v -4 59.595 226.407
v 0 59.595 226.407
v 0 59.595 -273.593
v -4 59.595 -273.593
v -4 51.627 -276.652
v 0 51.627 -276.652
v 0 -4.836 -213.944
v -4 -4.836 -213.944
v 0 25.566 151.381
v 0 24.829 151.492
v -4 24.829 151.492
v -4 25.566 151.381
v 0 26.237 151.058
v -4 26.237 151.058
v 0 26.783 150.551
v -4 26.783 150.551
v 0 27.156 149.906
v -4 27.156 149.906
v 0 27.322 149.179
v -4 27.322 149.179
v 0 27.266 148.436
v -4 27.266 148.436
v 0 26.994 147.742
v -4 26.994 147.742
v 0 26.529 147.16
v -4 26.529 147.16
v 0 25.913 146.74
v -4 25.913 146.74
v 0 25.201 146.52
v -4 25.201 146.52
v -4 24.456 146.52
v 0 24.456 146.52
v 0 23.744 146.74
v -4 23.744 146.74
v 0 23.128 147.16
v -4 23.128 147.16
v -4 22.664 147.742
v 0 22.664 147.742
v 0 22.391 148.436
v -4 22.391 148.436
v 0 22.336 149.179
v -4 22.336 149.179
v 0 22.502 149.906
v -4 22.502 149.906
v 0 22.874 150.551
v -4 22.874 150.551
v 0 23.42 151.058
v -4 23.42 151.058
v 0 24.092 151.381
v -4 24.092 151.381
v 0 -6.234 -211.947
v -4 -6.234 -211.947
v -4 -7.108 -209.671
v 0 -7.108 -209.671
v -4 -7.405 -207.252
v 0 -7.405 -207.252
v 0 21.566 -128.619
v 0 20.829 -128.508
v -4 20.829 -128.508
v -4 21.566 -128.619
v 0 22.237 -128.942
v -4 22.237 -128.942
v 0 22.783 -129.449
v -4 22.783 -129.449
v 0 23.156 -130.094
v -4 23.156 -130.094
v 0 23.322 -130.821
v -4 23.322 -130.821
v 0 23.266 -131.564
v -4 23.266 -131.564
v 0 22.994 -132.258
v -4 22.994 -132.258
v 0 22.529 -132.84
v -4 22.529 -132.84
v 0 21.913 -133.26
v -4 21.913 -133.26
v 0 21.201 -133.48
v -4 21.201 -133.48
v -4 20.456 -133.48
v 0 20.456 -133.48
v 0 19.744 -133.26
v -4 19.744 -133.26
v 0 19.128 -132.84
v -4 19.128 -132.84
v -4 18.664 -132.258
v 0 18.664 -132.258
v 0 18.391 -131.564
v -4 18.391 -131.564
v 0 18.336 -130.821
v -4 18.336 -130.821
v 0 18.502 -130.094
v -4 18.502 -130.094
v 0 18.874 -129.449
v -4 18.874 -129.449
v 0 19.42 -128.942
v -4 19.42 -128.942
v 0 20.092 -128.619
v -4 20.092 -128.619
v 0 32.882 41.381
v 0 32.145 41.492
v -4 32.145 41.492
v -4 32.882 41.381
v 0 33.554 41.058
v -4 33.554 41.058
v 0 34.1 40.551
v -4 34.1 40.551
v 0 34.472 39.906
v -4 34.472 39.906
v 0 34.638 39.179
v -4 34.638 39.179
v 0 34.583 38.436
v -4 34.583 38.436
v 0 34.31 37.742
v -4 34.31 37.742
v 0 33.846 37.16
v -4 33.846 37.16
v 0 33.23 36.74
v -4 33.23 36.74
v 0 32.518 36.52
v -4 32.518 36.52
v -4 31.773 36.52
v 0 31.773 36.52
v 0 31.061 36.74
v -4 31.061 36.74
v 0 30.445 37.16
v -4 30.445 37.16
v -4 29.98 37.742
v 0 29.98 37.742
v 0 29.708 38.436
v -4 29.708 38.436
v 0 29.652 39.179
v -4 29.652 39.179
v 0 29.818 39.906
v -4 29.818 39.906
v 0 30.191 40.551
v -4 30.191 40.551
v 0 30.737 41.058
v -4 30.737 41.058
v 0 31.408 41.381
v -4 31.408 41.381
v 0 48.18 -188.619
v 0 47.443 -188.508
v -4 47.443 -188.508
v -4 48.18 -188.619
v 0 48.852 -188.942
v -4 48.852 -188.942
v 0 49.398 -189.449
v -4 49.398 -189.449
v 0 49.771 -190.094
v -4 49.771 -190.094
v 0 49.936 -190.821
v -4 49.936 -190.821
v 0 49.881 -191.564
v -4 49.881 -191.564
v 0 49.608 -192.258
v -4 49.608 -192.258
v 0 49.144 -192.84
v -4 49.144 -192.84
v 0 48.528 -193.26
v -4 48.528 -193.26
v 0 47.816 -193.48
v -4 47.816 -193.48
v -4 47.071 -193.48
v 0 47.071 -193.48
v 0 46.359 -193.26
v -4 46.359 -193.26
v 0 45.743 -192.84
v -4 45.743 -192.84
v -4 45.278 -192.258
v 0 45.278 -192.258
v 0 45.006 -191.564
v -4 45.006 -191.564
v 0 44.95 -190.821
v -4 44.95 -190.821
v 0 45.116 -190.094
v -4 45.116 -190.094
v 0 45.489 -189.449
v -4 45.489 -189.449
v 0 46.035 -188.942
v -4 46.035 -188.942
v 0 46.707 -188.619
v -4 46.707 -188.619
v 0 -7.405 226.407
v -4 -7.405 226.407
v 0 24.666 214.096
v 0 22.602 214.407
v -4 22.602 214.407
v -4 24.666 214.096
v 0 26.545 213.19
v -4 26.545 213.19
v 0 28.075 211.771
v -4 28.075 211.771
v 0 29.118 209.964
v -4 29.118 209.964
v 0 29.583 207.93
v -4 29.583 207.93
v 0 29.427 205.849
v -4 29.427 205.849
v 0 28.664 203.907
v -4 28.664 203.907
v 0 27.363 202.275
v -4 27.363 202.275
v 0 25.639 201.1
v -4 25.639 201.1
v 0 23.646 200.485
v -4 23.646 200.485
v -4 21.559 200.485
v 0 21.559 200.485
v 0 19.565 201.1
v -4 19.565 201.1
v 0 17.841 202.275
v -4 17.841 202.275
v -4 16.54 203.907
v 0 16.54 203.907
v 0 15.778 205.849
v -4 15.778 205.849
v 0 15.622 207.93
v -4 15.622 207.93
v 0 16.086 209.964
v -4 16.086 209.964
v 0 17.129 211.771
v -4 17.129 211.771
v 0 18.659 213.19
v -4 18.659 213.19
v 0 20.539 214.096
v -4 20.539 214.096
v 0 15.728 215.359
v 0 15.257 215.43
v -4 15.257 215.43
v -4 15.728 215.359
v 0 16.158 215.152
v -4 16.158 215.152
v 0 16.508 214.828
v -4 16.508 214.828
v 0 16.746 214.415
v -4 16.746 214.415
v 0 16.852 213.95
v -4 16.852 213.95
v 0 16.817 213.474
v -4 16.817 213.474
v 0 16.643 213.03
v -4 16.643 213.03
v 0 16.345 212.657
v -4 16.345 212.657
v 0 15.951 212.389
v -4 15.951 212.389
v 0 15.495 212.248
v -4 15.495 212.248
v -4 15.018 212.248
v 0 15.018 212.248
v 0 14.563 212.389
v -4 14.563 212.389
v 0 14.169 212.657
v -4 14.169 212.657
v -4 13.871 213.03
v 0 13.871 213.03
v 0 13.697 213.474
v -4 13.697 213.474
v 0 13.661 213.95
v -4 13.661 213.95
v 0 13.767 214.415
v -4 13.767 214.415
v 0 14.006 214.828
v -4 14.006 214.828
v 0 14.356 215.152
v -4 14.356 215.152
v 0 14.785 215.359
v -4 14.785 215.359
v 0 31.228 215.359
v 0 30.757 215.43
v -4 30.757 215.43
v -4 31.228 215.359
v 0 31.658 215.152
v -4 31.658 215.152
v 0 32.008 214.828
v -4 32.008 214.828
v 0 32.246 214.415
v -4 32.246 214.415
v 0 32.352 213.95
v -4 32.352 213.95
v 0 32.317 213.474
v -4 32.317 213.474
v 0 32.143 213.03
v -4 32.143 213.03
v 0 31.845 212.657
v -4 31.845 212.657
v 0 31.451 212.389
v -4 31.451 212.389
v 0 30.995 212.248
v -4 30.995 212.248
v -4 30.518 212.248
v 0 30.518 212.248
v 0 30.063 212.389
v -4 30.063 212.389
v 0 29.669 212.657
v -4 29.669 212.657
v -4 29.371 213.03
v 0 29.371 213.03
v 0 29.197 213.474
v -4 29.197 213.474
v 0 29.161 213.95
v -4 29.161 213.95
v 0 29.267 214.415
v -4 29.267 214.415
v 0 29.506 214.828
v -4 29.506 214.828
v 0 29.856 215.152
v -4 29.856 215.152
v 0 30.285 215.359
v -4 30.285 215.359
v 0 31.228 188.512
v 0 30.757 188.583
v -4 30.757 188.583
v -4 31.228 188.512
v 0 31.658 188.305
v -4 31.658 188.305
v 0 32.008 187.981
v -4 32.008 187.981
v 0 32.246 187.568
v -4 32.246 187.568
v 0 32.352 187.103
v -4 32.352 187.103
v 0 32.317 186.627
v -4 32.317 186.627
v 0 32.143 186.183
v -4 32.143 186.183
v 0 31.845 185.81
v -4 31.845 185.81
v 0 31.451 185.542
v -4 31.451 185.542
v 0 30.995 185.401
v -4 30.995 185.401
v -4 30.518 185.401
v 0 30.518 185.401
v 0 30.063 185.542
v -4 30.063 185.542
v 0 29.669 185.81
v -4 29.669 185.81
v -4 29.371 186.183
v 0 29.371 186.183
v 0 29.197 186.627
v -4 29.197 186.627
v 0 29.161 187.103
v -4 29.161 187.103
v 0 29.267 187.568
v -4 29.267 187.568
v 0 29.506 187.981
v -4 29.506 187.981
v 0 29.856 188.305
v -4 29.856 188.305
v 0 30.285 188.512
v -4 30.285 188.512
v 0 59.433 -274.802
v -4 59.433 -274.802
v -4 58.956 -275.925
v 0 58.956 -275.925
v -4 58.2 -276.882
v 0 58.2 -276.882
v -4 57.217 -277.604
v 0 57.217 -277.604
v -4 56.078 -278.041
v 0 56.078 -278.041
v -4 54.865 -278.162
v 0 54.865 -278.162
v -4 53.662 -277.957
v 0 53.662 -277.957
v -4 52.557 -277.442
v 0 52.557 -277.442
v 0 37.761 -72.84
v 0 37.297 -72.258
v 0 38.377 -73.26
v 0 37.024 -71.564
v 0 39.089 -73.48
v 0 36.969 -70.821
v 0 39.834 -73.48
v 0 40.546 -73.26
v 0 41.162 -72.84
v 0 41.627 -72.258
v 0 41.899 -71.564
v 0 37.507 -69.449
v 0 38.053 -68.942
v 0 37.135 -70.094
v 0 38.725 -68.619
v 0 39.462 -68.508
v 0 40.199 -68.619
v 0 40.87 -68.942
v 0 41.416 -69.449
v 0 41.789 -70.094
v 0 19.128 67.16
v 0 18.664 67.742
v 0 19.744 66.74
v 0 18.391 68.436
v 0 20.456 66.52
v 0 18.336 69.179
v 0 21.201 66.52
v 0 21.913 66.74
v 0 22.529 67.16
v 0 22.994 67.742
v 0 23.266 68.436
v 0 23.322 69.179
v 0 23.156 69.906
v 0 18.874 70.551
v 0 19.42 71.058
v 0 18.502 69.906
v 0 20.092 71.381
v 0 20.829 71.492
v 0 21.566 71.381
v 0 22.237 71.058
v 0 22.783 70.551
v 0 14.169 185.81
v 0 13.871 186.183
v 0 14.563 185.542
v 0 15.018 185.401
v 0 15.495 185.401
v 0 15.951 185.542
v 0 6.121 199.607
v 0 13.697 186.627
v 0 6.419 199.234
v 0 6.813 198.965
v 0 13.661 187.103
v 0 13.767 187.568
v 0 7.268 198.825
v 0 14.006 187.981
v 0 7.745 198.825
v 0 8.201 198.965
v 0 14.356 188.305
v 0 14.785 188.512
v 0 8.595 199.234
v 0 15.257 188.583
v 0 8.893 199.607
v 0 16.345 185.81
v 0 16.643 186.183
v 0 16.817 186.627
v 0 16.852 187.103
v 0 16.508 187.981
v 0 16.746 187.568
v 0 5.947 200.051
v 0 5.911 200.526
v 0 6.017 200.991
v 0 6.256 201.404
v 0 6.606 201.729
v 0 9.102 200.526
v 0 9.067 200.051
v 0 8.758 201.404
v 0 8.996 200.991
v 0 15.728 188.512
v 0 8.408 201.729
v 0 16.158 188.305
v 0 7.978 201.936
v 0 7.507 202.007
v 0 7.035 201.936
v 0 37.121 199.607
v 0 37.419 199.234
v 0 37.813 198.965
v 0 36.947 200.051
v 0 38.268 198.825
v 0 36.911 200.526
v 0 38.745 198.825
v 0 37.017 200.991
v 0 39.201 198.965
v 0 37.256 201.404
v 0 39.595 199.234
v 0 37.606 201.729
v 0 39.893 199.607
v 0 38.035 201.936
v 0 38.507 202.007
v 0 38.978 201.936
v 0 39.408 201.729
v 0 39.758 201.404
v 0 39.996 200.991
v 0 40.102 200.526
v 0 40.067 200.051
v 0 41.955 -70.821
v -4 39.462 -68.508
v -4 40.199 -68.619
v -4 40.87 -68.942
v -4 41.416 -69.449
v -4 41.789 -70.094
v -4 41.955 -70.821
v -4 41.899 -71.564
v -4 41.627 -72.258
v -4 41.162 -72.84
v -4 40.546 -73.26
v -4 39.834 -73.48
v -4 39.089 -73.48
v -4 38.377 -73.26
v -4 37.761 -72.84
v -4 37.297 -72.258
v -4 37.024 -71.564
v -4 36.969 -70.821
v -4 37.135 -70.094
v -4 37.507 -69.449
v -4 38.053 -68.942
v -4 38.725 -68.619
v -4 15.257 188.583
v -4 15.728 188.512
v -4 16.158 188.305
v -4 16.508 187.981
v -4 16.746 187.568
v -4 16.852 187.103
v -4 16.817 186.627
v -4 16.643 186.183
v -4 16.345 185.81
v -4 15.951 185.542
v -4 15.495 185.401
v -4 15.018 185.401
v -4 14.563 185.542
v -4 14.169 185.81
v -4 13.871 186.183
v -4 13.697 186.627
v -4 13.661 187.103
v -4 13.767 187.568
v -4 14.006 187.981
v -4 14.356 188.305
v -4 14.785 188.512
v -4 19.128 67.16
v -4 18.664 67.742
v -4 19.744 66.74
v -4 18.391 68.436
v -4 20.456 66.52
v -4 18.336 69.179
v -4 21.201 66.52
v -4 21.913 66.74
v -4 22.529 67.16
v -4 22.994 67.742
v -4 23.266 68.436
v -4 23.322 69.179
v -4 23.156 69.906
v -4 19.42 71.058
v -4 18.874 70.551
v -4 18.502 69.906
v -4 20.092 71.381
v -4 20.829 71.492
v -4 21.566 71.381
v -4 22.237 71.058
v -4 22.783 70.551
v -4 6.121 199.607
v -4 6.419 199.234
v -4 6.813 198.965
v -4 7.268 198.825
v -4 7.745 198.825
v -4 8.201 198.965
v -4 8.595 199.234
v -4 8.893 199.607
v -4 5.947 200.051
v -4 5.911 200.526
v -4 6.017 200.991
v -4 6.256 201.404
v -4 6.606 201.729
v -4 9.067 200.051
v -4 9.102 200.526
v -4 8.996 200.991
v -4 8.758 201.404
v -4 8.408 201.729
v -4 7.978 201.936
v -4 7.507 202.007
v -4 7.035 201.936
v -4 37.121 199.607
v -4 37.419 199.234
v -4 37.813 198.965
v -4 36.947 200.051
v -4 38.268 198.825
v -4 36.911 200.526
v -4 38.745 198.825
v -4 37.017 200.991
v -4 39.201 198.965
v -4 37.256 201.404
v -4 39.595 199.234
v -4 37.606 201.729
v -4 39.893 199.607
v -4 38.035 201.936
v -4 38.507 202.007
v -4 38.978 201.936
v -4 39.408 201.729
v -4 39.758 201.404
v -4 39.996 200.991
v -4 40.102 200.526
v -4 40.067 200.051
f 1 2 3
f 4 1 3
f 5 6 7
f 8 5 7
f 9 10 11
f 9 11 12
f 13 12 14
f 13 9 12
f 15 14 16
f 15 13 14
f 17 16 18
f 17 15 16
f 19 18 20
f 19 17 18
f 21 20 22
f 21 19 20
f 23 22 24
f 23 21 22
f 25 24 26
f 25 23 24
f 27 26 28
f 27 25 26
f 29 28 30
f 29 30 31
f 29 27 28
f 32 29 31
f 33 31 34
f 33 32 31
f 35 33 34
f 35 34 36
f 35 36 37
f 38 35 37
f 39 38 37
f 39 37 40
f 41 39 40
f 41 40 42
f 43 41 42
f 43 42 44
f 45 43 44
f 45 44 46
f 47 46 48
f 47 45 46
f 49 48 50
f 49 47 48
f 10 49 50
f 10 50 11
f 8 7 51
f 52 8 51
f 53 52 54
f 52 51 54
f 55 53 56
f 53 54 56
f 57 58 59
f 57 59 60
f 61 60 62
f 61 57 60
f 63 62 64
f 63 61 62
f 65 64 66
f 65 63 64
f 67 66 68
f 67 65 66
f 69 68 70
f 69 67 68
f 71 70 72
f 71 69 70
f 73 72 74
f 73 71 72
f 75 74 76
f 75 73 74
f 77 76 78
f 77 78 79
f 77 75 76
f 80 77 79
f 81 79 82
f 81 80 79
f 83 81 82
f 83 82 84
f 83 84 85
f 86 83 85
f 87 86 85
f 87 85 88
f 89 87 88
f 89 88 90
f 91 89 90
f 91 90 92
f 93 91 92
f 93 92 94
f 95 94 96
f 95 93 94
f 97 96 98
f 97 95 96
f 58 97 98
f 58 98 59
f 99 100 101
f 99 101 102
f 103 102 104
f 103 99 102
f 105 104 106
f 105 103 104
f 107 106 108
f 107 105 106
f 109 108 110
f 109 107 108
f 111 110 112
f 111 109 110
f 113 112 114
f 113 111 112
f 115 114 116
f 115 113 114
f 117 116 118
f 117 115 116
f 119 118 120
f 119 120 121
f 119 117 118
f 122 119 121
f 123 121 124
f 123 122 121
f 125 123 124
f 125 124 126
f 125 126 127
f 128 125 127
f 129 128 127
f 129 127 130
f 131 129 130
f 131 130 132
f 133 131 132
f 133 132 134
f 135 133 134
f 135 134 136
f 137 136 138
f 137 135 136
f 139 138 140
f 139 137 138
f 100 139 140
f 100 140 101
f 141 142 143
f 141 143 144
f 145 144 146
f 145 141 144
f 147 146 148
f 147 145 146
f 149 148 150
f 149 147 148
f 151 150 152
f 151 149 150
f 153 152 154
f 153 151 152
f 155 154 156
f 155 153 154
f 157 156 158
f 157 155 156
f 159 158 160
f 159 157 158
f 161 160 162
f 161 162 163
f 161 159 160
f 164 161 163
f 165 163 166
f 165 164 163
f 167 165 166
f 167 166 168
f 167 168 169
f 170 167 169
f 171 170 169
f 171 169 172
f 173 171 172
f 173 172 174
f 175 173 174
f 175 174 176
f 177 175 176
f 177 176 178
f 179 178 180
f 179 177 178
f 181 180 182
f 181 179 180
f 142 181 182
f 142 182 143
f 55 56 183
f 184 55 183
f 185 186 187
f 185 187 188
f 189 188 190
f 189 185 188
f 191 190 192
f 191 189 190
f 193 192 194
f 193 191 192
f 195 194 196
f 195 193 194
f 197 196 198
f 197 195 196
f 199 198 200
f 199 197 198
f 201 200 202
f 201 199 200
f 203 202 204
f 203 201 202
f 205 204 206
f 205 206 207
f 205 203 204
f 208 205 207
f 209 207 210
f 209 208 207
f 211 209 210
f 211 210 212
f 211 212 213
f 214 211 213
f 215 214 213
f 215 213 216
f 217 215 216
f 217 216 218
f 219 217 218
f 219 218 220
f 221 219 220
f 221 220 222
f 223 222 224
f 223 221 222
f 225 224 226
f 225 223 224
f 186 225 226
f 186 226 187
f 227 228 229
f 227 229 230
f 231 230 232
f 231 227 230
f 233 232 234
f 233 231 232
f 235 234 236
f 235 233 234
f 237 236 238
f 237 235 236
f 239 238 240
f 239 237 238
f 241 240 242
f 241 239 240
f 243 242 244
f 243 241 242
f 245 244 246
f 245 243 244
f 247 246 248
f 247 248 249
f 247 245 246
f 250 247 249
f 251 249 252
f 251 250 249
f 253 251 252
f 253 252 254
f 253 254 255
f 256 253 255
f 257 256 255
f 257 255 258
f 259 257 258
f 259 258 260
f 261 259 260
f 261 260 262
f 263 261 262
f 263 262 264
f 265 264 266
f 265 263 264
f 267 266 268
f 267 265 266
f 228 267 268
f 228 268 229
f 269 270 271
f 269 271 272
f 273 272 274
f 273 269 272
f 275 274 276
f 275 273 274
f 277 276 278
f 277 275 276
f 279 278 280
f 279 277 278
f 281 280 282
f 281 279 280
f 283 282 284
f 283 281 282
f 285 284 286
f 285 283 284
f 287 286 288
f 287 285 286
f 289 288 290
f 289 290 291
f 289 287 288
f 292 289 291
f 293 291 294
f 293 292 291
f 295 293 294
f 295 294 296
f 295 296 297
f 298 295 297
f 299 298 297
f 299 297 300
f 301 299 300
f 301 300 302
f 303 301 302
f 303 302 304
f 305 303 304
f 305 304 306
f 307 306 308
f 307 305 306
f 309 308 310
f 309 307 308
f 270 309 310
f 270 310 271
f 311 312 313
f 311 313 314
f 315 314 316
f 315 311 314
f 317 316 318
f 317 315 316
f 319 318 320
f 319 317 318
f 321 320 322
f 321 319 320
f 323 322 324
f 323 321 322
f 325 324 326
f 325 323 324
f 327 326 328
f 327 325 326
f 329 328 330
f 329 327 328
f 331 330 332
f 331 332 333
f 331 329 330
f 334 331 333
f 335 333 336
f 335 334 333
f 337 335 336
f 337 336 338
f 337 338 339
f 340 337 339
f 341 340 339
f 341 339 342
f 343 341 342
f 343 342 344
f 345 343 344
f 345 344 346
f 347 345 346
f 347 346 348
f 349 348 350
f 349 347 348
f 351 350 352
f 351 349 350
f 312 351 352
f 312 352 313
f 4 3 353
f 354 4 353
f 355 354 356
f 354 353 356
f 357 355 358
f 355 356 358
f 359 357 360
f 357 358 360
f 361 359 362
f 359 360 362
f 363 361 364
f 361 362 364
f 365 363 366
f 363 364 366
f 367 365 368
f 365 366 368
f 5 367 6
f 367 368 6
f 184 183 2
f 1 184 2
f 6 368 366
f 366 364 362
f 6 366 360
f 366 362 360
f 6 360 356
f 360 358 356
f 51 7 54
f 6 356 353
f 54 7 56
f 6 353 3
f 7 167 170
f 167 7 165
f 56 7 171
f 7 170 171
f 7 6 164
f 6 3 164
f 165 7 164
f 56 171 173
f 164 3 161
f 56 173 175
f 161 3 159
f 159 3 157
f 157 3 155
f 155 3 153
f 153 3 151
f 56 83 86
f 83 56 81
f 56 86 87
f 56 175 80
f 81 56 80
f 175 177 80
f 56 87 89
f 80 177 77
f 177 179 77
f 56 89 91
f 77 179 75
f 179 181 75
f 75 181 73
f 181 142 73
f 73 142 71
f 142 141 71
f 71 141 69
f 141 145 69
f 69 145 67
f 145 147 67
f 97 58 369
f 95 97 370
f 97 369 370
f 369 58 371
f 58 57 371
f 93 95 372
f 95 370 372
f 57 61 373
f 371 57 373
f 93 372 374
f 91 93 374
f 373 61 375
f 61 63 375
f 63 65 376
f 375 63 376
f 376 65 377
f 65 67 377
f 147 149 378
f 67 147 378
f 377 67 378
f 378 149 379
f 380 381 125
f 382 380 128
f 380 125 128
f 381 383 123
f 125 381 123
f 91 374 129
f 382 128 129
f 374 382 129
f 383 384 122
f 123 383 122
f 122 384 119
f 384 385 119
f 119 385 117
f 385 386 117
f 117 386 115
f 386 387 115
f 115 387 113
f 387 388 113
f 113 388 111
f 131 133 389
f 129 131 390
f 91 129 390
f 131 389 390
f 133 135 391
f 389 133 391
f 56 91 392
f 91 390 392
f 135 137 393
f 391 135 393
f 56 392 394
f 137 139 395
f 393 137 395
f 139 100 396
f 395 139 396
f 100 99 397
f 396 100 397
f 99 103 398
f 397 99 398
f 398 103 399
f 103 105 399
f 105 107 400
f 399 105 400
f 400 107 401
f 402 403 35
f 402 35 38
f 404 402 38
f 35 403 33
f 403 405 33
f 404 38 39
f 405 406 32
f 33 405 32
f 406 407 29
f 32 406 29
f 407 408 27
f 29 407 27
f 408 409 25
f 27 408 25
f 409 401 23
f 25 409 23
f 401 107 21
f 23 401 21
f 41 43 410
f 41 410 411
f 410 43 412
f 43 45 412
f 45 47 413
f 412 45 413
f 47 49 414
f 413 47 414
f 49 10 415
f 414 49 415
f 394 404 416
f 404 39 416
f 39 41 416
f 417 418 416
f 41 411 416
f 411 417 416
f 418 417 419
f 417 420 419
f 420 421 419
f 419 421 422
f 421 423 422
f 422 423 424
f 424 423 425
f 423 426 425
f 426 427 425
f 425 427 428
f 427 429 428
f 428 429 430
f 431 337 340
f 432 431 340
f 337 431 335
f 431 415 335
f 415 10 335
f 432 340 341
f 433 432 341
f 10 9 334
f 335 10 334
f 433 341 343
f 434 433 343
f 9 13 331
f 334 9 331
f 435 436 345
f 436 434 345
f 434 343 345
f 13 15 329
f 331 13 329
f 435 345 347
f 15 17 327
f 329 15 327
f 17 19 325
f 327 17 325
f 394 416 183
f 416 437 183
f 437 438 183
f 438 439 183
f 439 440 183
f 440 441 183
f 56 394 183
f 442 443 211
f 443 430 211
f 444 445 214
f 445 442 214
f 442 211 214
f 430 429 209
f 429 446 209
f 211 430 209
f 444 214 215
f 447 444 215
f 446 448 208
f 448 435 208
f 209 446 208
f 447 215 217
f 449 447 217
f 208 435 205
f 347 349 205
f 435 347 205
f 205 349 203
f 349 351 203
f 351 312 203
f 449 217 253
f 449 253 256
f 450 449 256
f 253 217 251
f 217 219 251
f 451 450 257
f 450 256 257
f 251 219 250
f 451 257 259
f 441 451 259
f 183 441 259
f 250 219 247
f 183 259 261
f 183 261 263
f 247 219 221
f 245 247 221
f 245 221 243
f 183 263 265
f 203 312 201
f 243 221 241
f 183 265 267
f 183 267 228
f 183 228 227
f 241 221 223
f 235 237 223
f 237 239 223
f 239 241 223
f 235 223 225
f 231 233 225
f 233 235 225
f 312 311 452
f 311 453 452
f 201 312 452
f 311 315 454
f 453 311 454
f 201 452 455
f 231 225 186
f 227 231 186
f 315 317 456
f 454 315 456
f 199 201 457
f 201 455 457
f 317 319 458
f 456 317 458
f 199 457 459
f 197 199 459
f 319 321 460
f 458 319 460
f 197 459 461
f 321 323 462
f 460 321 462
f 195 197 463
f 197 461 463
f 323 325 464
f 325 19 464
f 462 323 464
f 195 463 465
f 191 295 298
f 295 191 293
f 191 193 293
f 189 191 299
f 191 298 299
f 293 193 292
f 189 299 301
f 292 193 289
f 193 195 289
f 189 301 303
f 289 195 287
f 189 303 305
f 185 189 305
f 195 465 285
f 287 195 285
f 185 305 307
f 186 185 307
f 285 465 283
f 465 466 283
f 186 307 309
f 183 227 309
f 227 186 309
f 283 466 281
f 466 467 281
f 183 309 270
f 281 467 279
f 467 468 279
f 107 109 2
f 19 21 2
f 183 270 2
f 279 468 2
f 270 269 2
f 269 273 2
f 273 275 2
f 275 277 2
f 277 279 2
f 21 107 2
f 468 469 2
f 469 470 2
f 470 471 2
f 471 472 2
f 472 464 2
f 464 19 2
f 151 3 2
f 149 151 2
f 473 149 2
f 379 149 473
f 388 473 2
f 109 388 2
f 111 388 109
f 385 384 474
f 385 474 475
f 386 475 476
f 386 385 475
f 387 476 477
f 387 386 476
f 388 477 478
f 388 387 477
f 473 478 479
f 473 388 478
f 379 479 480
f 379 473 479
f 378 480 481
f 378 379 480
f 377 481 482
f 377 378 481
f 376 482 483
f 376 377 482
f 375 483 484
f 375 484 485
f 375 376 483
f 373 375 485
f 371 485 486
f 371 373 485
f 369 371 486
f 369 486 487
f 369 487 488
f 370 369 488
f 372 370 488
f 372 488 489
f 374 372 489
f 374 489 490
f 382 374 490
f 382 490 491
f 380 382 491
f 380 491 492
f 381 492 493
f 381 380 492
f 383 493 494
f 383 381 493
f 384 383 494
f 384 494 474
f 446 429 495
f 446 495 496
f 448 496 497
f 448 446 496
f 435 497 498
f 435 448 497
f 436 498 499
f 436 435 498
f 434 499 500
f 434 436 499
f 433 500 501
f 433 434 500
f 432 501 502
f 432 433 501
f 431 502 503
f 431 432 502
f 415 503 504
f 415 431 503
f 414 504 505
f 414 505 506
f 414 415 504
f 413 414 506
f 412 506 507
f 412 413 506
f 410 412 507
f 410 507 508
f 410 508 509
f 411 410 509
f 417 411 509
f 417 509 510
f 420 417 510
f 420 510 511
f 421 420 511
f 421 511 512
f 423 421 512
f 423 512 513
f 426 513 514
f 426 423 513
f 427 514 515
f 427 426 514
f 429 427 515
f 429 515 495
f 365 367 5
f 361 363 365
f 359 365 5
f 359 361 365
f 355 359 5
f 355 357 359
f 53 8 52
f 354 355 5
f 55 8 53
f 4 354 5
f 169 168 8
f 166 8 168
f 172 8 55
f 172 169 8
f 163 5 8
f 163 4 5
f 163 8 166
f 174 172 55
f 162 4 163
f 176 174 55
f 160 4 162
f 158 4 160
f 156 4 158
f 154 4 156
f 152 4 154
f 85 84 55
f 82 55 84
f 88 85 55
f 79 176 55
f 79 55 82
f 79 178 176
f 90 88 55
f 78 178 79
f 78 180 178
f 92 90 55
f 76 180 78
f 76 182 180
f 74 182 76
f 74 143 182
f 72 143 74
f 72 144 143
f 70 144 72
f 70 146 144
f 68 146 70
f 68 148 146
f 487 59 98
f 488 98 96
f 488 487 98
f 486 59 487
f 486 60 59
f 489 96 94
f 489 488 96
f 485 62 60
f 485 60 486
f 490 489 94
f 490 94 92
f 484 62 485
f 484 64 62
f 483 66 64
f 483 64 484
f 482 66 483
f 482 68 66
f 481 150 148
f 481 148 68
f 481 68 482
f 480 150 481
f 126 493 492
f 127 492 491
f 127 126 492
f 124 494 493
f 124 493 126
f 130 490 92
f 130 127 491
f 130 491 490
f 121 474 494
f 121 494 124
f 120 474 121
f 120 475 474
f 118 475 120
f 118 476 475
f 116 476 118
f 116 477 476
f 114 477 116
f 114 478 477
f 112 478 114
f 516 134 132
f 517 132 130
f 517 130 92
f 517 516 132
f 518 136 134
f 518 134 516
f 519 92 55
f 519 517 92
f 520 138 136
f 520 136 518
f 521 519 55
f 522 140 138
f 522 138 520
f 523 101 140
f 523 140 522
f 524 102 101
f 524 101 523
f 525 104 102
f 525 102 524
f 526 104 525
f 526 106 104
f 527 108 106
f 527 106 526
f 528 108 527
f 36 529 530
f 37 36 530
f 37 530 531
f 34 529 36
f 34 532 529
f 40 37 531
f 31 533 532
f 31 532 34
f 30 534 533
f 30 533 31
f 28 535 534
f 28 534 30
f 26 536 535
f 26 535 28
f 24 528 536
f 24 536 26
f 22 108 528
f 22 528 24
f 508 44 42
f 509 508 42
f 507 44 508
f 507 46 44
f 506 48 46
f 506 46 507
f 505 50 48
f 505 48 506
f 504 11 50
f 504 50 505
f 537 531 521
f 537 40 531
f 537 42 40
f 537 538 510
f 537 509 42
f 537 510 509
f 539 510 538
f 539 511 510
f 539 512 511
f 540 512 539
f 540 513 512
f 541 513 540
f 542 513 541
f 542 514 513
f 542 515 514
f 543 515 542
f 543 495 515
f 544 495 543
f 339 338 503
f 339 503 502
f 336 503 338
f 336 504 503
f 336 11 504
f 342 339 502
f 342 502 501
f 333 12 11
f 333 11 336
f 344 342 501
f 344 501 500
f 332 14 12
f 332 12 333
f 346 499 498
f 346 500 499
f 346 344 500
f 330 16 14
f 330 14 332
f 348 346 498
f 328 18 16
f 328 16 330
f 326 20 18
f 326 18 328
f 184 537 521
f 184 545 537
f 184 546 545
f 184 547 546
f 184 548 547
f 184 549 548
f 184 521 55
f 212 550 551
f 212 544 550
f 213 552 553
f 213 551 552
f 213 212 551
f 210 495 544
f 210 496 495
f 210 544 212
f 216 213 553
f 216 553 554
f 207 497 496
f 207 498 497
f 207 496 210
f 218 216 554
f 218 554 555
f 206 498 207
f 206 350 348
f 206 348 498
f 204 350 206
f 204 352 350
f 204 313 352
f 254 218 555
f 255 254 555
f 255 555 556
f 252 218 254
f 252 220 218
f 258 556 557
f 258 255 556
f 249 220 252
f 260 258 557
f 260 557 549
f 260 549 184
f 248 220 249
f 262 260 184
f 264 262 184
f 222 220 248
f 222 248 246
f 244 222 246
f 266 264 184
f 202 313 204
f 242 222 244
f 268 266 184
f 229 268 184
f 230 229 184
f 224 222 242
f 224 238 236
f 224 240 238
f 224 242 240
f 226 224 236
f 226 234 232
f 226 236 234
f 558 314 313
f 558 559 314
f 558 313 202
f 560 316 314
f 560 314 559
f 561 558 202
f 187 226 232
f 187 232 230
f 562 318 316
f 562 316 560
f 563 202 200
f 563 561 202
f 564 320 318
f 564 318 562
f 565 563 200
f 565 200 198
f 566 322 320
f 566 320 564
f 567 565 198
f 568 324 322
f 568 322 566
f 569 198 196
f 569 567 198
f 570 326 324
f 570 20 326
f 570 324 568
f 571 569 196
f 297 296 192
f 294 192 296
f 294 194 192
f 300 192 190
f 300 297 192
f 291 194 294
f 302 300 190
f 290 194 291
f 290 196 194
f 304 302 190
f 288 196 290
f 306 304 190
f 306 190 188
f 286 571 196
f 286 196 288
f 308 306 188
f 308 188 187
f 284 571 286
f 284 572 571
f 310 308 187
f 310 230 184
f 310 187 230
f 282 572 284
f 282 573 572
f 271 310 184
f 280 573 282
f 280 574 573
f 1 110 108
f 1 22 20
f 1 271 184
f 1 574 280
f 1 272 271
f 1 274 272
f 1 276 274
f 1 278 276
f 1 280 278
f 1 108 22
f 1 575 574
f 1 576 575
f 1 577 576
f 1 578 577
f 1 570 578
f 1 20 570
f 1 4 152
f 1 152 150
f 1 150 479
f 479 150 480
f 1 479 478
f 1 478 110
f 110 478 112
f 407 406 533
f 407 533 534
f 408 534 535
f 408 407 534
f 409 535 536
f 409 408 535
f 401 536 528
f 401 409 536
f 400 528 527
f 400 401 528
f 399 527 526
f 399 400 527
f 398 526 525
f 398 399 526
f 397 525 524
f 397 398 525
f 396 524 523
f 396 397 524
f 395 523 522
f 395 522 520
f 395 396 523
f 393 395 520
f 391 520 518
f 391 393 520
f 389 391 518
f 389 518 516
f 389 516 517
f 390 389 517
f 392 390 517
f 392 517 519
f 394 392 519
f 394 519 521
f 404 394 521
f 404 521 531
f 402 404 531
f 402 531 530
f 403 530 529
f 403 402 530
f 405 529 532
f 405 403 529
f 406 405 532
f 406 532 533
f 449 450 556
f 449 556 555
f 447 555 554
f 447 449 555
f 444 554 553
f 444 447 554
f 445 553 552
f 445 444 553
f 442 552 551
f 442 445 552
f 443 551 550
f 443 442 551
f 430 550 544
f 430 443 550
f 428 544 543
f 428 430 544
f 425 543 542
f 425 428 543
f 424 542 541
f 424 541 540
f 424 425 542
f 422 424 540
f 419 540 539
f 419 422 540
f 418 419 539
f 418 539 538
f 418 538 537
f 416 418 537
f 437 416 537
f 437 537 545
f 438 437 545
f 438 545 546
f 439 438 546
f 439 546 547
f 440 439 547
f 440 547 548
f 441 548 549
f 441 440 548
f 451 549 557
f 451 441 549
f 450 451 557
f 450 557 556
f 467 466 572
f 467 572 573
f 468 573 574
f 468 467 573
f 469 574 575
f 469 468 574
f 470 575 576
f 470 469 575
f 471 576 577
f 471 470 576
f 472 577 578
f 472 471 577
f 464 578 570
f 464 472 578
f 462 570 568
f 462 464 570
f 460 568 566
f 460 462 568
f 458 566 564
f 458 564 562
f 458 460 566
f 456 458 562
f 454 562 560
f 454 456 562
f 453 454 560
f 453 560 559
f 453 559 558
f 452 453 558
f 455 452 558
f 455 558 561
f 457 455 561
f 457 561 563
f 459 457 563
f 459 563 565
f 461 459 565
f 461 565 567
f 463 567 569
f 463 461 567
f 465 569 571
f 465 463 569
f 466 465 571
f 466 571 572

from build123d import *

# Parameters (mm, degrees)
SKETCH_1_R      = 2.5
SKETCH_1_R_2    = 7
SKETCH_1_R_3    = 1.6
EXTRUDE_1_DEPTH = 4


with BuildPart() as part:
    # 草图1 → 凸台-拉伸1 (new body)
    with BuildSketch(Plane.ZY):
        with BuildLine():
            Line((-207.252247772, -7.404631077), (226.406668198, -7.404631077))
            Line((226.406668198, -7.404631077), (226.406668198, 59.595368923))
            Line((226.406668198, 59.595368923), (-273.593331802, 59.595368923))
            ThreePointArc((-273.593331802, 59.595368923), (-277.860990507, 56.662288358), (-276.652116001, 51.626963655))
            Line((-276.652116001, 51.626963655), (-213.943553835, -4.836079331))
            ThreePointArc((-213.943553835, -4.836079331), (-210.835927267, -6.740435342), (-207.252247772, -7.404631077))
        make_face()
        with Locations((-191.007742204, 47.443421044)):
            Circle(SKETCH_1_R, mode=Mode.SUBTRACT)
        with Locations((68.992257796, 20.828748174)):
            Circle(SKETCH_1_R, mode=Mode.SUBTRACT)
        with Locations((38.992257796, 32.145259985)):
            Circle(SKETCH_1_R, mode=Mode.SUBTRACT)
        with Locations((-131.007742204, 20.828748174)):
            Circle(SKETCH_1_R, mode=Mode.SUBTRACT)
        with Locations((207.406668198, 22.602258186)):
            Circle(SKETCH_1_R_2, mode=Mode.SUBTRACT)
        with Locations((148.992257796, 24.828748174)):
            Circle(SKETCH_1_R, mode=Mode.SUBTRACT)
        with Locations((-71.007742204, 39.461771796)):
            Circle(SKETCH_1_R, mode=Mode.SUBTRACT)
        with Locations((213.830061956, 30.756889262)):
            Circle(SKETCH_1_R_3, mode=Mode.SUBTRACT)
        with Locations((200.406668198, 38.506889262)):
            Circle(SKETCH_1_R_3, mode=Mode.SUBTRACT)
        with Locations((186.983274439, 30.756889262)):
            Circle(SKETCH_1_R_3, mode=Mode.SUBTRACT)
        with Locations((186.983274439, 15.256889262)):
            Circle(SKETCH_1_R_3, mode=Mode.SUBTRACT)
        with Locations((200.406668198, 7.506889262)):
            Circle(SKETCH_1_R_3, mode=Mode.SUBTRACT)
        with Locations((213.830061956, 15.256889262)):
            Circle(SKETCH_1_R_3, mode=Mode.SUBTRACT)
    extrude(amount=EXTRUDE_1_DEPTH)


solid = part.part
